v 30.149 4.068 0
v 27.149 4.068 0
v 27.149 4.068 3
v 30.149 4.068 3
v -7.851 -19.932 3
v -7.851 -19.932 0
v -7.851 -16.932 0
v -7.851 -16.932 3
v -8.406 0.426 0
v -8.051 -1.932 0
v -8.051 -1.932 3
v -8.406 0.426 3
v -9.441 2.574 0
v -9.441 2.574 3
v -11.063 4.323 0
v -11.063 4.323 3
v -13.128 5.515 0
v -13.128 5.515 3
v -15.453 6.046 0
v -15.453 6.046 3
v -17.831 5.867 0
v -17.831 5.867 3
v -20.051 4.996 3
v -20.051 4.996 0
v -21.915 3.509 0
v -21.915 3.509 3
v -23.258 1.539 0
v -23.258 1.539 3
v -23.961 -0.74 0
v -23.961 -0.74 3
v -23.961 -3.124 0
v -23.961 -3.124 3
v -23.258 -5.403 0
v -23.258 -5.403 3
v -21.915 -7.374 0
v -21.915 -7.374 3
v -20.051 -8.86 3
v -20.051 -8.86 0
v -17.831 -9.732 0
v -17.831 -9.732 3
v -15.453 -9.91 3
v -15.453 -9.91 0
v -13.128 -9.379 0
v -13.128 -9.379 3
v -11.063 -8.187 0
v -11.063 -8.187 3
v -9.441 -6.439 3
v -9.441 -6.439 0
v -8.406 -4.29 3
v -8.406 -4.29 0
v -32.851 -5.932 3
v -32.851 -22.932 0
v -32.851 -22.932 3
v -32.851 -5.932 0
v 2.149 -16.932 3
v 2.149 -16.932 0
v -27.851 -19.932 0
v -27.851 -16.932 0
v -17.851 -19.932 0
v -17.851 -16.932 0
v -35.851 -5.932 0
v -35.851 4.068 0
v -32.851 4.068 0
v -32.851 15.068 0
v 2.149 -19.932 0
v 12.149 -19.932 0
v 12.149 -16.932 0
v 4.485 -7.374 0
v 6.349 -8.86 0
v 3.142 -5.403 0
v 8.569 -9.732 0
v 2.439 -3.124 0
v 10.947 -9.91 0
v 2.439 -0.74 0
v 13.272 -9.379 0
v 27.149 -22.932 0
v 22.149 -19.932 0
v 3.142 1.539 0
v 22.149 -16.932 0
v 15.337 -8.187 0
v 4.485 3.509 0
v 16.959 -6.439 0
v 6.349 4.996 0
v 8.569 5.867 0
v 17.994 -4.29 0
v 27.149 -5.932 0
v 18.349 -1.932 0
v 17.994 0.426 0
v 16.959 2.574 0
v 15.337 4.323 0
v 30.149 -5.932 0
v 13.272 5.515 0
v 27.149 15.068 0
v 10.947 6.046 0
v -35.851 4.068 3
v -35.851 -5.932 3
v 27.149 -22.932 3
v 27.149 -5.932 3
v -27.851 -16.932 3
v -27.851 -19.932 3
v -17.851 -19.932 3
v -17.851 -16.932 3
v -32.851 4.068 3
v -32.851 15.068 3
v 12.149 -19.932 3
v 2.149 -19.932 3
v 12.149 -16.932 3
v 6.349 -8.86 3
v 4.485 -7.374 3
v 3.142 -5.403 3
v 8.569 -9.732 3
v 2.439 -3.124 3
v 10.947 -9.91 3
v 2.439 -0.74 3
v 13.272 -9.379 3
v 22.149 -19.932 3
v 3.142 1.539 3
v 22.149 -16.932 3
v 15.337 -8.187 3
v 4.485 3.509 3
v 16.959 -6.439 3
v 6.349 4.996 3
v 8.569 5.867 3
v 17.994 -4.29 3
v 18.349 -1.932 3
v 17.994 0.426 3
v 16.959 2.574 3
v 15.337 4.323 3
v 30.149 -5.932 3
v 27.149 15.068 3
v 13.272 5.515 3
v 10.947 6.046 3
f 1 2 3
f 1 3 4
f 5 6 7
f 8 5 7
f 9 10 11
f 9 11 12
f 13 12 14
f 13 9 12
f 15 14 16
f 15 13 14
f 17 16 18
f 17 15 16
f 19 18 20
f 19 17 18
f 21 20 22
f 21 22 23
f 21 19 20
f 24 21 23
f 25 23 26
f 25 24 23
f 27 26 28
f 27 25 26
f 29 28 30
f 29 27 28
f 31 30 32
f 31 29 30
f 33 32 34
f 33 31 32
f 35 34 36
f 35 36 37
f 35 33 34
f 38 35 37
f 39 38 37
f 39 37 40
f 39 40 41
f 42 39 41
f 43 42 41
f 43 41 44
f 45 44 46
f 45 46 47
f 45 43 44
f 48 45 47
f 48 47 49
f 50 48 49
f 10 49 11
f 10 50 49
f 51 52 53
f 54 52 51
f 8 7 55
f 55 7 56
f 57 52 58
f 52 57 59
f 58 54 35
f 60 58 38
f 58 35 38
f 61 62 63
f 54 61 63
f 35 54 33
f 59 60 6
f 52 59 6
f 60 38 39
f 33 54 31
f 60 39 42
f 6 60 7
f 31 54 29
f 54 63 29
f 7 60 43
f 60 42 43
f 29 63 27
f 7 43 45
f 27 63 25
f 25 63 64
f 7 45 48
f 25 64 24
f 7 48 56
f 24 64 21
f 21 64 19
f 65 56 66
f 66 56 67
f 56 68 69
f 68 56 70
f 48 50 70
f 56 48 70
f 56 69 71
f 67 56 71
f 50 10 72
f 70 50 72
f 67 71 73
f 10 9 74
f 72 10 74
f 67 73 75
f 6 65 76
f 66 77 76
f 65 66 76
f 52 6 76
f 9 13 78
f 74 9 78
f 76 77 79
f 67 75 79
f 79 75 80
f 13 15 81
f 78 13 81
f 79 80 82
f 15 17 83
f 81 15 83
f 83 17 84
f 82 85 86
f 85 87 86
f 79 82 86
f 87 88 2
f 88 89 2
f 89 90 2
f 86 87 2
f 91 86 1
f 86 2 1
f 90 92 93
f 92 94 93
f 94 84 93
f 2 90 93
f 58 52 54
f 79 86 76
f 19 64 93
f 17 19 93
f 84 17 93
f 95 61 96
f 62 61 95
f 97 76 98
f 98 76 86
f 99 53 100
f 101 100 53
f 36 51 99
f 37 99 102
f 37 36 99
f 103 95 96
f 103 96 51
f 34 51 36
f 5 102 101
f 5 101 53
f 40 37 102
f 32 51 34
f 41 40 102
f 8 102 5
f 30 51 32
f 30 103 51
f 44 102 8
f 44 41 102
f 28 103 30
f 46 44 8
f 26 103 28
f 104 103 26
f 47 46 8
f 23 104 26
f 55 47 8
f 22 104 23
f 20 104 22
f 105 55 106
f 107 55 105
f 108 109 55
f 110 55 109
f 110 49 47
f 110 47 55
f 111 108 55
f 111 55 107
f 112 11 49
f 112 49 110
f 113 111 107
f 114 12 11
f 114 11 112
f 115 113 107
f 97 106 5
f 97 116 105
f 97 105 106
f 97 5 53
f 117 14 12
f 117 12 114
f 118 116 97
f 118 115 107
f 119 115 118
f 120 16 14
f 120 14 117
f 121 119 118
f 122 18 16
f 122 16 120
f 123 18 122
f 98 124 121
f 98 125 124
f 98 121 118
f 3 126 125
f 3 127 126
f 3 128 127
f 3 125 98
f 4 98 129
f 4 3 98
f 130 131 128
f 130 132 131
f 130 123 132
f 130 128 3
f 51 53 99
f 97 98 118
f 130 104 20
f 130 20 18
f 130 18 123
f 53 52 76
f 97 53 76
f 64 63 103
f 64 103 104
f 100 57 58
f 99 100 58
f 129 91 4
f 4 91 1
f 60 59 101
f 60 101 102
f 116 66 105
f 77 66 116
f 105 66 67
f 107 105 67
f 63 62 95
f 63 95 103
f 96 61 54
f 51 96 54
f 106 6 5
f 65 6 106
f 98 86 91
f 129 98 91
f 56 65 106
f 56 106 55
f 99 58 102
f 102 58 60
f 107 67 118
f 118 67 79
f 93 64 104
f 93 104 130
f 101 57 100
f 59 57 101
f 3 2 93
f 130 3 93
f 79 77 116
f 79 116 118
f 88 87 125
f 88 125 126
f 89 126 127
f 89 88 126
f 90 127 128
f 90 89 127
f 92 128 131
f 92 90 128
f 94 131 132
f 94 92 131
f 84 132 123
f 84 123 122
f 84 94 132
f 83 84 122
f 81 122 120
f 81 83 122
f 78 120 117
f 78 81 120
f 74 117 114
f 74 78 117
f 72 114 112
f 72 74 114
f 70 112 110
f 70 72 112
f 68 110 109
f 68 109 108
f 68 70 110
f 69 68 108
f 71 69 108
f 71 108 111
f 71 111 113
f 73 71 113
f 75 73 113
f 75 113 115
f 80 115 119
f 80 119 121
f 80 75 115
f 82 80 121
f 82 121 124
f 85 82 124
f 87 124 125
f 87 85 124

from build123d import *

# Parameters (mm, degrees)
SKETCH1_W           = 60
SKETCH1_H           = 38
SKETCH1_R           = 8
SKETCH1_W_2         = 10
SKETCH1_H_2         = 3
SKETCH1_W_3         = 3
SKETCH1_H_3         = 10
BOSS_EXTRUDE1_DEPTH = 3


with BuildPart() as part:
    # Sketch1 → Boss-Extrude1 (new body)
    # profile 1 of 3: a face of its own
    with BuildSketch(Plane.XY):
        with Locations((-2.850678733, -3.932126697)):
            Rectangle(SKETCH1_W, SKETCH1_H)
        with Locations((-16.050678733, -1.932126697)):
            Circle(SKETCH1_R, mode=Mode.SUBTRACT)
        with Locations((10.349321267, -1.932126697)):
            Circle(SKETCH1_R, mode=Mode.SUBTRACT)
        with Locations((-2.850678733, -18.432126697)):
            Rectangle(SKETCH1_W_2, SKETCH1_H_2, mode=Mode.SUBTRACT)
        with Locations((17.149321267, -18.432126697)):
            Rectangle(SKETCH1_W_2, SKETCH1_H_2, mode=Mode.SUBTRACT)
        with Locations((-22.850678733, -18.432126697)):
            Rectangle(SKETCH1_W_2, SKETCH1_H_2, mode=Mode.SUBTRACT)
    # profile 2 of 3: a face of its own
    with BuildSketch(Plane.XY):
        with Locations((-34.350678733, -0.932126697)):
            Rectangle(SKETCH1_W_3, SKETCH1_H_3)
    # profile 3 of 3: a face of its own
    with BuildSketch(Plane.XY):
        with Locations((28.649321267, -0.932126697)):
            Rectangle(SKETCH1_W_3, SKETCH1_H_3)
    extrude(amount=BOSS_EXTRUDE1_DEPTH)


solid = part.part
